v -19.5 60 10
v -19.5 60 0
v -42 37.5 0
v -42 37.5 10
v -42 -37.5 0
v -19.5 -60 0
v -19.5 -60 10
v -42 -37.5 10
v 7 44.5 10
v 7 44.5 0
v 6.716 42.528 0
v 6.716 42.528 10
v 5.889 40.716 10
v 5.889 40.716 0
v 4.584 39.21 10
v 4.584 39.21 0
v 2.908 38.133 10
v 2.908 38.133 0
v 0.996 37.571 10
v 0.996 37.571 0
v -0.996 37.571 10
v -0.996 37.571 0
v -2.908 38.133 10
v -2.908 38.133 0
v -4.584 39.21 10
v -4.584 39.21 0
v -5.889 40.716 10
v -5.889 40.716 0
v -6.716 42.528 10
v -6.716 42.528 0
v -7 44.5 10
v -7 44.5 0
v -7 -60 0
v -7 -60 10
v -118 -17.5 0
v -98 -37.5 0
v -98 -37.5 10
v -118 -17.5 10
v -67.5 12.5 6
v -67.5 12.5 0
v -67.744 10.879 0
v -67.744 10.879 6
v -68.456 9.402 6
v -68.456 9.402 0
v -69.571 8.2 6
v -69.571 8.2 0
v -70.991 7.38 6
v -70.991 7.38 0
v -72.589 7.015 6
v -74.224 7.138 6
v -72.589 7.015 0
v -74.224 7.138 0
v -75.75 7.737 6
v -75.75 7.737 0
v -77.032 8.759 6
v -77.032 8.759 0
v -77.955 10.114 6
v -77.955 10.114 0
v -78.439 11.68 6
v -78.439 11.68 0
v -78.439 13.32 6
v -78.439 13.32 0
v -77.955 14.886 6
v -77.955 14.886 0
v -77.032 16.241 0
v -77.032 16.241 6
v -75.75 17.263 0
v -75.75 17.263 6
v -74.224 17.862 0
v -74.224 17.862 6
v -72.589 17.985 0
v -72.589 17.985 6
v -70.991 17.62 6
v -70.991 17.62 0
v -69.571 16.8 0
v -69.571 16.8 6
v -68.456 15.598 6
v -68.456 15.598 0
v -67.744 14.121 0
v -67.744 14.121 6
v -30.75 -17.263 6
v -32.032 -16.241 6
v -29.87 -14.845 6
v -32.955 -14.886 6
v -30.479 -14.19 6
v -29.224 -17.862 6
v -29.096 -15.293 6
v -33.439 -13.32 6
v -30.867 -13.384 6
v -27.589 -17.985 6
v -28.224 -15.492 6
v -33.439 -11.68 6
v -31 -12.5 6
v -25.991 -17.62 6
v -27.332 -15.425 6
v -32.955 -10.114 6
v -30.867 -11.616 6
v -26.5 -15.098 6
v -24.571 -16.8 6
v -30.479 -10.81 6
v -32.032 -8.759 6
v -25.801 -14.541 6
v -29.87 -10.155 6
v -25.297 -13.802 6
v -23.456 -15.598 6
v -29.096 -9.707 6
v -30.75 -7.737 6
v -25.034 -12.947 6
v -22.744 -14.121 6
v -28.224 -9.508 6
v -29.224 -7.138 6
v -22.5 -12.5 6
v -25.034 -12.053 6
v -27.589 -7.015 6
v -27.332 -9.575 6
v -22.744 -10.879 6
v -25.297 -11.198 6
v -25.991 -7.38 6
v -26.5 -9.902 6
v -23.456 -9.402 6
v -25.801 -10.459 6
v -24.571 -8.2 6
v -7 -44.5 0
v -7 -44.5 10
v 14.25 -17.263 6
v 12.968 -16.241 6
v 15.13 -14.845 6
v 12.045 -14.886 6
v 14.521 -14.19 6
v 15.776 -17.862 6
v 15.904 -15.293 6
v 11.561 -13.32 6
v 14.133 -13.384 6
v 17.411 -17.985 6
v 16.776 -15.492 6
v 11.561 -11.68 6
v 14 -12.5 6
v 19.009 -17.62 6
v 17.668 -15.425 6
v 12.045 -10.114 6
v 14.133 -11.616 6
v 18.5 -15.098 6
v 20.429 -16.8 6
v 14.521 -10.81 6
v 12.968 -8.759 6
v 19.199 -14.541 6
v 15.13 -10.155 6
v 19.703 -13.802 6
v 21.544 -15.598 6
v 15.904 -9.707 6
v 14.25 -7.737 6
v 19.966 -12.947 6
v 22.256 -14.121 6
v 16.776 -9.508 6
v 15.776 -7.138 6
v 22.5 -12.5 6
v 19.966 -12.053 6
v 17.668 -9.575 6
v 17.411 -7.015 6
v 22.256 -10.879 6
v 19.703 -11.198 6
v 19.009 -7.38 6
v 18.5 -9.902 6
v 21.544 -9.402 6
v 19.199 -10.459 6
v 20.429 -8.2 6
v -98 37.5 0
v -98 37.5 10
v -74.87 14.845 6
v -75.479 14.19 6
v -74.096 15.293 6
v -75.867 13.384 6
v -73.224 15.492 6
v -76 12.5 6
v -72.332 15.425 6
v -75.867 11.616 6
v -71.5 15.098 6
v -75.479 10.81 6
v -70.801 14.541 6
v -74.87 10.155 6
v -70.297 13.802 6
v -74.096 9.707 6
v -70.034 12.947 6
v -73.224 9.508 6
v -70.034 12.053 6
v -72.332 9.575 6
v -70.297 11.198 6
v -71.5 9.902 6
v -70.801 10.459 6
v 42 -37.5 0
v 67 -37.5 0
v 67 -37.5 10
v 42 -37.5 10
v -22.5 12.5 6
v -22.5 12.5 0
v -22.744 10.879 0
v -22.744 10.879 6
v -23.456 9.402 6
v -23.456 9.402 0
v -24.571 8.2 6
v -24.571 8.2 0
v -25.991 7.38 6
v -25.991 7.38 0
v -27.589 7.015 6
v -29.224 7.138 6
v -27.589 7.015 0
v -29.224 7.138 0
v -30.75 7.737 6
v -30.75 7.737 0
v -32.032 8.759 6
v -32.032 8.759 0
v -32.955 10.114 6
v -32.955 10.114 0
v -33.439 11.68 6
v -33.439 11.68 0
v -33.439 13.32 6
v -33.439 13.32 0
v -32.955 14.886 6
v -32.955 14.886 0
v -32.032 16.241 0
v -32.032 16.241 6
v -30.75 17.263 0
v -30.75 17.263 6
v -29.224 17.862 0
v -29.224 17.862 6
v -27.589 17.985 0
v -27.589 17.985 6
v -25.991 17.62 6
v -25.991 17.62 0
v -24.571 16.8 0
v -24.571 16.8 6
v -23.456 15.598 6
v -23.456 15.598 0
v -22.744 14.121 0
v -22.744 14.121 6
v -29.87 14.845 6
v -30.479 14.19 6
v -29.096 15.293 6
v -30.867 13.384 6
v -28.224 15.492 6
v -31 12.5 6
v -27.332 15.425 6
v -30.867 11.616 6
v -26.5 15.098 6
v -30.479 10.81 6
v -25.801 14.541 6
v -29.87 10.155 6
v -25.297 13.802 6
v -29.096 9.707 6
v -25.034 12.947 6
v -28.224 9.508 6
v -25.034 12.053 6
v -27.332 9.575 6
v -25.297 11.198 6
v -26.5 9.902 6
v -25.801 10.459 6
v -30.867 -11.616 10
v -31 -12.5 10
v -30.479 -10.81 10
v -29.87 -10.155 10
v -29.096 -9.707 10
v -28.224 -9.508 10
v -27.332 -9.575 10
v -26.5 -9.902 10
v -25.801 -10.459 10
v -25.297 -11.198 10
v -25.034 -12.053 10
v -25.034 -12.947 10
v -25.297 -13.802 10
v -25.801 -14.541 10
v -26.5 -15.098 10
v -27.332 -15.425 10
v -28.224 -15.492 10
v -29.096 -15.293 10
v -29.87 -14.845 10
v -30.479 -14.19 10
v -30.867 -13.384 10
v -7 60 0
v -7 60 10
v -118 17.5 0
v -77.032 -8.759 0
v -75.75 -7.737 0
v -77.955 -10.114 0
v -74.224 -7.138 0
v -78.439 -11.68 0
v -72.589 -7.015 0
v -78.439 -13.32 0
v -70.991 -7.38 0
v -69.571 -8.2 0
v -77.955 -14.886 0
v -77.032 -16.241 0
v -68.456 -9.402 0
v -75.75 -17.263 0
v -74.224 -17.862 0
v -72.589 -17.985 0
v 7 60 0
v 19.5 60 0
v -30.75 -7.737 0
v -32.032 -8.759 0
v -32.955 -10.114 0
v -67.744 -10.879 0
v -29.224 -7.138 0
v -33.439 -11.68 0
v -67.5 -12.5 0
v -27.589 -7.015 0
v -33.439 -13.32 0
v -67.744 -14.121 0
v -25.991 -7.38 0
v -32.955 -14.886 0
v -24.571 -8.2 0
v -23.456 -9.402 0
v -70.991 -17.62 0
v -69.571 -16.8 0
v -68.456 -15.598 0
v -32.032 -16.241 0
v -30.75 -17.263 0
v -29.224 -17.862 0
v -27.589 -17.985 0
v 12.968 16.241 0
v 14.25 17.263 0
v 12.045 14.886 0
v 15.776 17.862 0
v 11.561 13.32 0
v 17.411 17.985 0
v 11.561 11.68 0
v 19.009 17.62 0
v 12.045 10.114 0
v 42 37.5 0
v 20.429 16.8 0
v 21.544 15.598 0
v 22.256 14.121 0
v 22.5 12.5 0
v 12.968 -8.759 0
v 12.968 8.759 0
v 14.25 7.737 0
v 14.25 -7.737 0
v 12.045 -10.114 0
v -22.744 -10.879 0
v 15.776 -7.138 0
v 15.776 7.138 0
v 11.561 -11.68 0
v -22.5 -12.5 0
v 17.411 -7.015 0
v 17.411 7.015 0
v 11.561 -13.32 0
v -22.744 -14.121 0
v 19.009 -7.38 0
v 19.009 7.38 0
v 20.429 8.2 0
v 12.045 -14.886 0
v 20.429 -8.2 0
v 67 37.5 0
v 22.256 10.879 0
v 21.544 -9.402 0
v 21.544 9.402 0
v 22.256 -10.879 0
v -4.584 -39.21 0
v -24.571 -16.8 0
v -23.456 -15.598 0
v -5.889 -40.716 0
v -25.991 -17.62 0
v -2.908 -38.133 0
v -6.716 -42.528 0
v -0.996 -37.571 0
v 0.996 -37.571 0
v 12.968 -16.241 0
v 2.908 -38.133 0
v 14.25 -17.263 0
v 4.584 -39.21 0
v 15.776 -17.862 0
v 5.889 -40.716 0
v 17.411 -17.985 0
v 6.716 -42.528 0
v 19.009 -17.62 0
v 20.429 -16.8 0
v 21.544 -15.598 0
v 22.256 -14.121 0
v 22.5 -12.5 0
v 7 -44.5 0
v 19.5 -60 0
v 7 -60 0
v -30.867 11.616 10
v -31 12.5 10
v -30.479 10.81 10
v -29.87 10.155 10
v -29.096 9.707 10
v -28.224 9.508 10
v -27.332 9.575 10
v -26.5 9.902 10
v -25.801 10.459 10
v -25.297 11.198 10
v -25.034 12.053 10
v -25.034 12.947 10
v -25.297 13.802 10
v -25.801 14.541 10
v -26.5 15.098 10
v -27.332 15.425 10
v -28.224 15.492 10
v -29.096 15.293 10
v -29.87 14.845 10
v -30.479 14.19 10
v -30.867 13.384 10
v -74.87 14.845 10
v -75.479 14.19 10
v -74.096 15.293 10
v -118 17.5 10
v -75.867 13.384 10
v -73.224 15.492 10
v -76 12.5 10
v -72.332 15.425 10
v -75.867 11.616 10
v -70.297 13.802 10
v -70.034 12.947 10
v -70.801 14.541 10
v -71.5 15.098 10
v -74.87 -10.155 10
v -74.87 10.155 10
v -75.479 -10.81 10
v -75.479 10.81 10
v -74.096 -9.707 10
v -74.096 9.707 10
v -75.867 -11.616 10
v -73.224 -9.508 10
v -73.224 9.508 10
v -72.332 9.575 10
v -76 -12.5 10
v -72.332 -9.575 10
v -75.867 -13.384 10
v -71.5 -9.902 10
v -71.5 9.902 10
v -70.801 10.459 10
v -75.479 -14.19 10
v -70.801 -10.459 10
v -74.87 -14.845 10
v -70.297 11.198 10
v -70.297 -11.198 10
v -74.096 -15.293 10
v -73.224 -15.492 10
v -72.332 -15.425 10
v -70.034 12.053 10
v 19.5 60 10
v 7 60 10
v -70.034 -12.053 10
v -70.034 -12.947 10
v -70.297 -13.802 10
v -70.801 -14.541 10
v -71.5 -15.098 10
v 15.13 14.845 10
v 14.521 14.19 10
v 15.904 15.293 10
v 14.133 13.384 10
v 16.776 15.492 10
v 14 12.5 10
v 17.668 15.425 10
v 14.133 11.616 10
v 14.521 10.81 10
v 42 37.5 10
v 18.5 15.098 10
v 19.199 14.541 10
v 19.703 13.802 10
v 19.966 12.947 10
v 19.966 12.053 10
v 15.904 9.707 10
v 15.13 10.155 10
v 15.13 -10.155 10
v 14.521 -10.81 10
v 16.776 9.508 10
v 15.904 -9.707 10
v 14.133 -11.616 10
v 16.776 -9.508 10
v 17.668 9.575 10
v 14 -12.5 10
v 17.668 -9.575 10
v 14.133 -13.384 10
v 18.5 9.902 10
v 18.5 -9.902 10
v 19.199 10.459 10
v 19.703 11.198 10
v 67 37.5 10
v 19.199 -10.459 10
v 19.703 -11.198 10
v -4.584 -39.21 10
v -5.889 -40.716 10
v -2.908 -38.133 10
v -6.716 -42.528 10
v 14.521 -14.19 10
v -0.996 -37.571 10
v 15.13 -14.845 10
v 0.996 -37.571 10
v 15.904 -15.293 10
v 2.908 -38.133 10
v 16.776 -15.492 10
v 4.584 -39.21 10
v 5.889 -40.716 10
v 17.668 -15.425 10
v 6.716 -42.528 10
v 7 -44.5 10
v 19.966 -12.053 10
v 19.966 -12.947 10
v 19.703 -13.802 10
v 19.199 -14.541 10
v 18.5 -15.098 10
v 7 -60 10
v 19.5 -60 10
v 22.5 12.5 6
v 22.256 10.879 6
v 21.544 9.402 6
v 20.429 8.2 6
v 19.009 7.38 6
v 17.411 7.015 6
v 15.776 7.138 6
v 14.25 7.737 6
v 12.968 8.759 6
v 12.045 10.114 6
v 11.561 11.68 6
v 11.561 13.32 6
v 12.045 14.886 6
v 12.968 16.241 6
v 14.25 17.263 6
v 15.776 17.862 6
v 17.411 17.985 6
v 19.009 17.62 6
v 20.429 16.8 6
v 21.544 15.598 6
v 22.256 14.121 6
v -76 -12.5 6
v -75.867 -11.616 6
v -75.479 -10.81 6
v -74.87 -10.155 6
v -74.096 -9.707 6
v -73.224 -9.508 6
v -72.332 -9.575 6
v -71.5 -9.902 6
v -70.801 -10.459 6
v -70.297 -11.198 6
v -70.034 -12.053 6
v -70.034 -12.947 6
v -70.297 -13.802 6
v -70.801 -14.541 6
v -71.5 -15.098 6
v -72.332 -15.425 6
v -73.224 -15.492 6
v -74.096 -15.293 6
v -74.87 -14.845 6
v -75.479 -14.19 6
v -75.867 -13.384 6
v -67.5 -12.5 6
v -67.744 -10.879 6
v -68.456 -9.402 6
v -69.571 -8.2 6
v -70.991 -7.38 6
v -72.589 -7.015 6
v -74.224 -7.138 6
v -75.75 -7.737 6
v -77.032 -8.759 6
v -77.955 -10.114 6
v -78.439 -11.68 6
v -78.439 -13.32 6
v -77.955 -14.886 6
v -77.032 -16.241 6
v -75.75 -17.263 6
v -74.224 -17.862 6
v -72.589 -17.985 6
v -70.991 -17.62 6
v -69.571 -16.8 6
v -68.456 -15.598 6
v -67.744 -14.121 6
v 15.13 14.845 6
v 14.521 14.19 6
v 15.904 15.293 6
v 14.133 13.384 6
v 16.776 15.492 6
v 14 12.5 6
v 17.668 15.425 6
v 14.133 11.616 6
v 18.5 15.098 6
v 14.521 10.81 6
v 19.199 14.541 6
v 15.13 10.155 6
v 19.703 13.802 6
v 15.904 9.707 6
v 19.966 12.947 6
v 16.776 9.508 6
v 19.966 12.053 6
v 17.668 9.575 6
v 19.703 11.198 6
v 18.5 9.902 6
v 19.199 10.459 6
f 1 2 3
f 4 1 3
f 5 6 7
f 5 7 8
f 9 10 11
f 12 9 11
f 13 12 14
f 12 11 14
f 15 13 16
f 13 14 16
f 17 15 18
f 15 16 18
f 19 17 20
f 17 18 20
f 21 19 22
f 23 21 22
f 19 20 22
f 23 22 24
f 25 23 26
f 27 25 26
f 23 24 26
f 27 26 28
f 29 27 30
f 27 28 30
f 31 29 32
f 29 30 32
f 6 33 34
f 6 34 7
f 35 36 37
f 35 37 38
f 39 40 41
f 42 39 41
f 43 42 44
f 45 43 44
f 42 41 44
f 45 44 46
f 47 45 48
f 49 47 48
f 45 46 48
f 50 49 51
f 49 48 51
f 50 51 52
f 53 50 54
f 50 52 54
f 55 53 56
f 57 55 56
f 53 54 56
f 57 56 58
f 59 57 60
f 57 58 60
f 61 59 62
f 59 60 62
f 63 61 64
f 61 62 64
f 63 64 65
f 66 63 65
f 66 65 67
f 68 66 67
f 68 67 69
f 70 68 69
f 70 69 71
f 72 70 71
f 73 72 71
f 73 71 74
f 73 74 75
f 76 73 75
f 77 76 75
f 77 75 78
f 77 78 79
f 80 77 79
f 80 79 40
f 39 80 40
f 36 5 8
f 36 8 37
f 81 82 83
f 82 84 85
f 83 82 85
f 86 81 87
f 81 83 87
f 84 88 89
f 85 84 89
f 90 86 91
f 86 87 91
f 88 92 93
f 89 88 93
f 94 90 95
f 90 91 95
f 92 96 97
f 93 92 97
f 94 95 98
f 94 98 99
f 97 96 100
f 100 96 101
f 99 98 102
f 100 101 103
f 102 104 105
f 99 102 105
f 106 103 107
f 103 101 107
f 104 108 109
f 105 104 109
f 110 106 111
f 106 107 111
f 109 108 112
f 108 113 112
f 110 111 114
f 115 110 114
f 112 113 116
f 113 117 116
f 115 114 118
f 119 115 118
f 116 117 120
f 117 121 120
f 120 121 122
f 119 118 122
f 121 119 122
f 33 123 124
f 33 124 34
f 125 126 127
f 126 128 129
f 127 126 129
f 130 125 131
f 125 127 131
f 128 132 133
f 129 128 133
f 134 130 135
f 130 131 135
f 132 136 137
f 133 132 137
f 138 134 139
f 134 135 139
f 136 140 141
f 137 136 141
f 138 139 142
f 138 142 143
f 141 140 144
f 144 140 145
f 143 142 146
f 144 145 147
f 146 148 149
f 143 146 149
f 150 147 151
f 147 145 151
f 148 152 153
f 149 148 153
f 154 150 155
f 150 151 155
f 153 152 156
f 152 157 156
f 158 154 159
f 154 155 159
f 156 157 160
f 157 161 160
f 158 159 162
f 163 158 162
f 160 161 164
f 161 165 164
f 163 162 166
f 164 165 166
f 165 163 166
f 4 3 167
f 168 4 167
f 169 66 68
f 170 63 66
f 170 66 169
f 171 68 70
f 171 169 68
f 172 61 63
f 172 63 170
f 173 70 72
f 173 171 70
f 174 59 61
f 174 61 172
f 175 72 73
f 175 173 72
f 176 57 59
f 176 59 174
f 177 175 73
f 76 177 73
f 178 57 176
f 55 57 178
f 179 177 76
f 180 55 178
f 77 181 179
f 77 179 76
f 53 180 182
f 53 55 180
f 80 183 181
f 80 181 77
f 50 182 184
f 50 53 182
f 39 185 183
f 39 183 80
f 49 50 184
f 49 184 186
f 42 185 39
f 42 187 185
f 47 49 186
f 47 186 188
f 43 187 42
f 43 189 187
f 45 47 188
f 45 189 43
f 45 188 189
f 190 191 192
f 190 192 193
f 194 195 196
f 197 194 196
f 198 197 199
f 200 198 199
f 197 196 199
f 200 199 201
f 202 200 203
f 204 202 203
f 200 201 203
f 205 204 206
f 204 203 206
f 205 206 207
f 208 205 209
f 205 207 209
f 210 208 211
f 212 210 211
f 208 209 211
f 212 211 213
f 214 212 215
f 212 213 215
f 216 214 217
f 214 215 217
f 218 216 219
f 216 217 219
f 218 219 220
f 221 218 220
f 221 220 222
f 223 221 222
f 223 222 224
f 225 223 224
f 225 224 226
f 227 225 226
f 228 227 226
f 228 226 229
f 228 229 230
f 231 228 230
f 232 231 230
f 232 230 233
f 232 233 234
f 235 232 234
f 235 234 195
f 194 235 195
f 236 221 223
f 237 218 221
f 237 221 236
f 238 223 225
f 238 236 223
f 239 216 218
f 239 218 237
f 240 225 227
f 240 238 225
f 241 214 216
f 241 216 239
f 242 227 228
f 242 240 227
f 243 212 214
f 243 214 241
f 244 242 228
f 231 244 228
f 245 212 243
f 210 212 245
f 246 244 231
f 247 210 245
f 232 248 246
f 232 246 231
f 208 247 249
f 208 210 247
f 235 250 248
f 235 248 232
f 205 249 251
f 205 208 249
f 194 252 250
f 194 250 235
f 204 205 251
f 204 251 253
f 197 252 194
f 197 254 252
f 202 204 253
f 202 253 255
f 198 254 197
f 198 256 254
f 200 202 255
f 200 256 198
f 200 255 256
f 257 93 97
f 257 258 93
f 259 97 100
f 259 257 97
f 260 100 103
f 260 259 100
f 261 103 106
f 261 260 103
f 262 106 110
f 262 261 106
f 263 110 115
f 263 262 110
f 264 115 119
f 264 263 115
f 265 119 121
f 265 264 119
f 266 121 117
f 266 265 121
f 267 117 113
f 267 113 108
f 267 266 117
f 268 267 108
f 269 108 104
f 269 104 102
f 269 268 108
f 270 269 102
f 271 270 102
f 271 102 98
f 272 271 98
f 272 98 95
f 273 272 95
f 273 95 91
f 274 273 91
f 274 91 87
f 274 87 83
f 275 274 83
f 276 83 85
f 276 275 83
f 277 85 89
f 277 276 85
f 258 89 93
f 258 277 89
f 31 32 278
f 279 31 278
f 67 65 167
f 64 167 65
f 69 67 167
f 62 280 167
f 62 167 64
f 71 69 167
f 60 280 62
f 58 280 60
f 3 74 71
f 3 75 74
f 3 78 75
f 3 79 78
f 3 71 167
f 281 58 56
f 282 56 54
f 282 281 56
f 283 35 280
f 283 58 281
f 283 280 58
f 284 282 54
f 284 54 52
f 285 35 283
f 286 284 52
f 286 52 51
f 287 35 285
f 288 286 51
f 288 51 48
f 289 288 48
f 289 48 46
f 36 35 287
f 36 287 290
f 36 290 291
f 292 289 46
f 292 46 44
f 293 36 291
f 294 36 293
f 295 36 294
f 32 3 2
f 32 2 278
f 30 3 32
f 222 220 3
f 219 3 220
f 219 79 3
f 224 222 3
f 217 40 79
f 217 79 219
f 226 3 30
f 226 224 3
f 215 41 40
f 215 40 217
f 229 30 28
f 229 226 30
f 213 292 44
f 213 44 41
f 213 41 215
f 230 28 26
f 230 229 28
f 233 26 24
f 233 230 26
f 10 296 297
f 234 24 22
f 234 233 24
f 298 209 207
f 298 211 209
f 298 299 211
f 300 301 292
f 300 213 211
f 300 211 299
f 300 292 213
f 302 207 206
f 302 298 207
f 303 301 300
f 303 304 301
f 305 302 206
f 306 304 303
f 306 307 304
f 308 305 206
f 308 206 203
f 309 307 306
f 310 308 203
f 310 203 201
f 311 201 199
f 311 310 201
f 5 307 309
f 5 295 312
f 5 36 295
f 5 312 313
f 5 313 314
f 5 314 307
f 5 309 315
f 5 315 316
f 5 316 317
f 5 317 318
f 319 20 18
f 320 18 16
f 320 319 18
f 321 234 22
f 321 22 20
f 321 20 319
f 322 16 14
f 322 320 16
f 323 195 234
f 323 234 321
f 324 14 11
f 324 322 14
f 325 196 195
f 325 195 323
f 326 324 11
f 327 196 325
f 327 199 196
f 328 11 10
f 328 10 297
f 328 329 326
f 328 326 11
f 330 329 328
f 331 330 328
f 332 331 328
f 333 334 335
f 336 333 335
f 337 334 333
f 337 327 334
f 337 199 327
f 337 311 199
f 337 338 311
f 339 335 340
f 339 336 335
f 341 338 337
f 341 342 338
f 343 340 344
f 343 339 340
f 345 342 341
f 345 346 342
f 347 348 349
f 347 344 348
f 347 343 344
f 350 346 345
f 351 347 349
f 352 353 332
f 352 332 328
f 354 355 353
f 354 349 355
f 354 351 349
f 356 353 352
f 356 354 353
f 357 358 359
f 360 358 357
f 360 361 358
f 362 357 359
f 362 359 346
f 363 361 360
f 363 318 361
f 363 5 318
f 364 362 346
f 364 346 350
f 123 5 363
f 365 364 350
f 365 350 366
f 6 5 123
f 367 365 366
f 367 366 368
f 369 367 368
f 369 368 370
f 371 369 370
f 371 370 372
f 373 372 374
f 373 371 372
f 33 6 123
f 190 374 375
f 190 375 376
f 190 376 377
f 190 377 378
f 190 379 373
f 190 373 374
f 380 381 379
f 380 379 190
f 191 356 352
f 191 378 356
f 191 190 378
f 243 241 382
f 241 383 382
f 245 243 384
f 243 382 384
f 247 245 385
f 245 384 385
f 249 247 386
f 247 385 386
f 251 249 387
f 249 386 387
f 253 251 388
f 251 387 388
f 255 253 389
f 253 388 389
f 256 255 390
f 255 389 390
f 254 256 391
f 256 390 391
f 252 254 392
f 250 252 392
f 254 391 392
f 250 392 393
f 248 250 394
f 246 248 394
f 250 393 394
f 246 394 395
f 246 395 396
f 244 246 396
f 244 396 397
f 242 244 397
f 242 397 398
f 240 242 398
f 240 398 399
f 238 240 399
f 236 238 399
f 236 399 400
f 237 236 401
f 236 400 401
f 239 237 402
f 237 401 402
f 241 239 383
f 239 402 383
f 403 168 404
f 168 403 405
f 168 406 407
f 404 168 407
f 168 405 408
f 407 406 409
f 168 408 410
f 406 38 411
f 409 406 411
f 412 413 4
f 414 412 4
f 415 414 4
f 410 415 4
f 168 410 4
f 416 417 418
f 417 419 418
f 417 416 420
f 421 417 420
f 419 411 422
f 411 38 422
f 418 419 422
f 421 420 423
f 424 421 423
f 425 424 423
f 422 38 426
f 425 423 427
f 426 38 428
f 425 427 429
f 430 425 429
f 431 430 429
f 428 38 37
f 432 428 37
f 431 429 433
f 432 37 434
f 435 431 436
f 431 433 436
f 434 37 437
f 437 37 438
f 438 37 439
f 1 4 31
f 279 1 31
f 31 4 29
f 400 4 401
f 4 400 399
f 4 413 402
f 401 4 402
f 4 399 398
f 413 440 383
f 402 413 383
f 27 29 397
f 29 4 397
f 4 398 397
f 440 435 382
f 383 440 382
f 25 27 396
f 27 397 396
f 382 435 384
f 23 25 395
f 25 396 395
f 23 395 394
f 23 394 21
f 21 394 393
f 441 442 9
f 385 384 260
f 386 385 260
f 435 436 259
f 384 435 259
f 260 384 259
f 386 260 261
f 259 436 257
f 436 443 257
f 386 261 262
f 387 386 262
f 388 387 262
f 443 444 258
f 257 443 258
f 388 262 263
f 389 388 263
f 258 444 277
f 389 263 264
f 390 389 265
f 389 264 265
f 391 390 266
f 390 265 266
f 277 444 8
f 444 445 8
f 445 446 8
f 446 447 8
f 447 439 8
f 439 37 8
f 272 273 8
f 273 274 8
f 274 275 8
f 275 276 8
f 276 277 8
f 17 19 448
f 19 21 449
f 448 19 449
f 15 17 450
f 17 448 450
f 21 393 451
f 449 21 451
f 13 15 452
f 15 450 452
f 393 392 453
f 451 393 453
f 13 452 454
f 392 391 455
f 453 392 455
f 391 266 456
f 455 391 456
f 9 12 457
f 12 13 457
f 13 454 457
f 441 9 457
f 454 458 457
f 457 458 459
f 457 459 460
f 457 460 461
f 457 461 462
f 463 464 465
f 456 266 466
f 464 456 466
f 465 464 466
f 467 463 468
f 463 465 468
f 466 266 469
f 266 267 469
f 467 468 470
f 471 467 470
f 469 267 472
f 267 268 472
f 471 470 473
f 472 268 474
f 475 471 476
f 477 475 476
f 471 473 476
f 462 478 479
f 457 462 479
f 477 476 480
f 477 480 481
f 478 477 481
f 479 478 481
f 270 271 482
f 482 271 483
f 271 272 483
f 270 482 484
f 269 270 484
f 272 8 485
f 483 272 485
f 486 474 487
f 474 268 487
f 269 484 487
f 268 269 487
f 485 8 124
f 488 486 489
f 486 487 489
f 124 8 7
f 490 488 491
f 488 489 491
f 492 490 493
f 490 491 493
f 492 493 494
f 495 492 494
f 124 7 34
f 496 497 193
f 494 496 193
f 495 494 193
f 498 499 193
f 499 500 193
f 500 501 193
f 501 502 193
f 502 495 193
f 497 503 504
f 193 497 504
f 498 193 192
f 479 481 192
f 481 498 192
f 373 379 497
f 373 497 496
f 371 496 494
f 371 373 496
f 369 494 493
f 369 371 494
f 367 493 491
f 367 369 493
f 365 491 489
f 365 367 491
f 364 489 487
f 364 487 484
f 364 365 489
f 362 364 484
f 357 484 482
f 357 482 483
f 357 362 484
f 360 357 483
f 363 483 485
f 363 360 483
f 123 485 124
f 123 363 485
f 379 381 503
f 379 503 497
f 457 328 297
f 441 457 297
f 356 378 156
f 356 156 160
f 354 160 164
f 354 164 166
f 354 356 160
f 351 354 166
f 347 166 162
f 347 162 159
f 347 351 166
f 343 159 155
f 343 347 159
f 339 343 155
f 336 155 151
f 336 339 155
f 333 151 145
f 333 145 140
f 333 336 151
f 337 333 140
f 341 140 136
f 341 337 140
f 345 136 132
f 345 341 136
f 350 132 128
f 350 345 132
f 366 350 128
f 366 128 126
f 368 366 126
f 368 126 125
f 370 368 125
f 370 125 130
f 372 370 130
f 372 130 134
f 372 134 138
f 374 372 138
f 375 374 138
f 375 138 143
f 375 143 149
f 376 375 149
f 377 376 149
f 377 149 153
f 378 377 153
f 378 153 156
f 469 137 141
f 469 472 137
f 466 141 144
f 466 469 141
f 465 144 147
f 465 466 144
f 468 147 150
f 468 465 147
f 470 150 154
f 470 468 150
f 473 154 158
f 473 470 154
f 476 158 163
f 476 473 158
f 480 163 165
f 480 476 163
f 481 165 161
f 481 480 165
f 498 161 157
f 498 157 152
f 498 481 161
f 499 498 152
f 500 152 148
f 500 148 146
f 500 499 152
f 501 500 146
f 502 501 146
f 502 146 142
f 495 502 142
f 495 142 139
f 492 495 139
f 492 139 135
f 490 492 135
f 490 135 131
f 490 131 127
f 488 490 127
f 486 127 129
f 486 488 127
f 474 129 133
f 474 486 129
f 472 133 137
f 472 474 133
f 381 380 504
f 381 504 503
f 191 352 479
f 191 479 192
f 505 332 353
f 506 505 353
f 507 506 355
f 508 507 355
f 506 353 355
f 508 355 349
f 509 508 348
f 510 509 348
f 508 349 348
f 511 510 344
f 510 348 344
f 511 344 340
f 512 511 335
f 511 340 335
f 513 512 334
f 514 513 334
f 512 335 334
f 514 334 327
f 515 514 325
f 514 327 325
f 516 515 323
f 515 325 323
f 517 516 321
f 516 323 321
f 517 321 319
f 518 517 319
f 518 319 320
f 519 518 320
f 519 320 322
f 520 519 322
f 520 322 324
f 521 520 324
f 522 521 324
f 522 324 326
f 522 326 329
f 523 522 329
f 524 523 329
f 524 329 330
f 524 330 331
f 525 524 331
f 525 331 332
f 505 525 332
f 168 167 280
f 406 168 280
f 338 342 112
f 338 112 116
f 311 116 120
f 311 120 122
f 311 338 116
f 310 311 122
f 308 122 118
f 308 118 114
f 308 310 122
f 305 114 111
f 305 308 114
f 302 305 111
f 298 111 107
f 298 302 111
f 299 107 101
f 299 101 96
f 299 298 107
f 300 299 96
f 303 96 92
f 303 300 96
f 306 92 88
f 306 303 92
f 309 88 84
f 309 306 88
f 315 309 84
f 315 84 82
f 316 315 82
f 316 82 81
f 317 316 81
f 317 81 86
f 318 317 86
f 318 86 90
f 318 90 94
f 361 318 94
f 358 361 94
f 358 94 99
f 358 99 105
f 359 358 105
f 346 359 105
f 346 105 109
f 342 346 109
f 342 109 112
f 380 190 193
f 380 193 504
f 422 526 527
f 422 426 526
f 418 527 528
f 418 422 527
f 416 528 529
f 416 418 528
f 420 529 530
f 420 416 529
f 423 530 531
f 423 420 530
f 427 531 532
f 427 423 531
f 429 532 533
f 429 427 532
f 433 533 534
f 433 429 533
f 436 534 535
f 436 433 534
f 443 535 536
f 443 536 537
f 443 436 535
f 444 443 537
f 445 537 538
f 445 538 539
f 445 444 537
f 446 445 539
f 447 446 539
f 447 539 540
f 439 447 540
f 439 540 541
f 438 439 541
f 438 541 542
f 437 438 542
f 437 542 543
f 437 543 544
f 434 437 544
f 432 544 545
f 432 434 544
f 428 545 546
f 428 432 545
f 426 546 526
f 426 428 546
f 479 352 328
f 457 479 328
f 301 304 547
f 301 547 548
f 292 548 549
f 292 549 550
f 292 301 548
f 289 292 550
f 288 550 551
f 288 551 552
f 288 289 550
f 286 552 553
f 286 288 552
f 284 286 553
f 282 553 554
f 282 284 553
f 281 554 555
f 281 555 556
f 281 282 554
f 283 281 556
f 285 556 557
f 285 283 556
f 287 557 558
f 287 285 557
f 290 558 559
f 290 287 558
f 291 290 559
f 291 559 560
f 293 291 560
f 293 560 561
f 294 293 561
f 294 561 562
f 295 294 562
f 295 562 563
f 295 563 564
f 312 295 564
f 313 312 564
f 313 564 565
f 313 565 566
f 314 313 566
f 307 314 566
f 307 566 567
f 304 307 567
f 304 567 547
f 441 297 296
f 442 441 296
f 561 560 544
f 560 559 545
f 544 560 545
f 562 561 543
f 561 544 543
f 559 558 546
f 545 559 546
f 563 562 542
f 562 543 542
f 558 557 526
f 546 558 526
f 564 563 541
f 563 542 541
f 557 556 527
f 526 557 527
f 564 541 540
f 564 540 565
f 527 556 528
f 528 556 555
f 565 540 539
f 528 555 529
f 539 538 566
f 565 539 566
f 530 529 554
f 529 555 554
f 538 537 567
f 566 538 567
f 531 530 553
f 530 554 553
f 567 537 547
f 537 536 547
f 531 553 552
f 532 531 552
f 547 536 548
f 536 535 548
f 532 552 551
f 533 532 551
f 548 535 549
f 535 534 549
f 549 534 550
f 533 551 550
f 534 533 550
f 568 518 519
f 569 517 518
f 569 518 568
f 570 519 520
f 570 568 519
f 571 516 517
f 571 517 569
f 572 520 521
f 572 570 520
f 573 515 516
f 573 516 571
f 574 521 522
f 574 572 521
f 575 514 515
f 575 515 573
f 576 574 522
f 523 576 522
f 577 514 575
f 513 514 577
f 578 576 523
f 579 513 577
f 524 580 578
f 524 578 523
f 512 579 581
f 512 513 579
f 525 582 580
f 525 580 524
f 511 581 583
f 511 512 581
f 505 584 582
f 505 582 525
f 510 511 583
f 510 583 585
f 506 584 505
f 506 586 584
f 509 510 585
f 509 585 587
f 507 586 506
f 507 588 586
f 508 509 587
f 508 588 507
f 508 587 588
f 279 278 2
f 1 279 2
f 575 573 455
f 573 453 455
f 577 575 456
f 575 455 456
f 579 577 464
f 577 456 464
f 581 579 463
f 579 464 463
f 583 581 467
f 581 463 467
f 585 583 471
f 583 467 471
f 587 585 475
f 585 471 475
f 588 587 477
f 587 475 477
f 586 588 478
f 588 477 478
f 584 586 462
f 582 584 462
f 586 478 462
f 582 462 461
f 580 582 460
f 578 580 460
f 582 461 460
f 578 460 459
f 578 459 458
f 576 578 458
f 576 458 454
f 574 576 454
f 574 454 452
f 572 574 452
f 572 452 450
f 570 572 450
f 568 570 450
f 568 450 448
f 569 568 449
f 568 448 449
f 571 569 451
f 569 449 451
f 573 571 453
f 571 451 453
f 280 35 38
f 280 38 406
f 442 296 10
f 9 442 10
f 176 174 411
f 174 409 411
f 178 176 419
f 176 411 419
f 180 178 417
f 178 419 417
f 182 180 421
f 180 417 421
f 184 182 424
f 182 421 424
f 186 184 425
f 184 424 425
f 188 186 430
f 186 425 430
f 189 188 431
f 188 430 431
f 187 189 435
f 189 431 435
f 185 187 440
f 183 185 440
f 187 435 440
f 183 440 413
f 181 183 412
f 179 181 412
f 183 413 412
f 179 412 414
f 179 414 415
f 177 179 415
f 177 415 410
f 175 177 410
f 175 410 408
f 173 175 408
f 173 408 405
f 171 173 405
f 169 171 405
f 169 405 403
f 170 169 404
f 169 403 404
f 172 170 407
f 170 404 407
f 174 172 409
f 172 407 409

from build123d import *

# Parameters (mm, degrees)
F1_DEPTH       = 10
F2_D           = 6
F2_CBORE_D     = 11
F2_CBORE_DEPTH = 6


with BuildPart() as f1:
    # F0 (on Top) → F1 (new body)
    with BuildSketch(Plane.XY):
        with BuildLine():
            Line((-118, 17.5), (-118, 0))
            Line((-118, 0), (67, 0))
            Line((67, 0), (67, 37.5))
            Line((67, 37.5), (42, 37.5))
            Line((42, 37.5), (19.5, 60))
            Line((19.5, 60), (7, 60))
            Line((7, 60), (7, 44.5))
            ThreePointArc((7, 44.5), (0, 37.5), (-7, 44.5))
            Line((-7, 44.5), (-7, 60))
            Line((-7, 60), (-19.5, 60))
            Line((-19.5, 60), (-42, 37.5))
            Line((-42, 37.5), (-98, 37.5))
            Line((-98, 37.5), (-118, 17.5))
        make_face()
    extrude(amount=F1_DEPTH)

    # F2 (through all)
    with Locations(Plane(origin=(0, 0, 0), x_dir=(1, 0, 0), z_dir=(0, 0, -1))):
        with Locations((-73, -12.5), (-28, -12.5), (17, -12.5)):
            CounterBoreHole(F2_D / 2, F2_CBORE_D / 2, F2_CBORE_DEPTH)

    # F3: F1 across plane


with BuildPart() as f1_1:
    add(f1.part)
    add(f1.part.mirror(Plane.XZ))


solid = f1_1.part
